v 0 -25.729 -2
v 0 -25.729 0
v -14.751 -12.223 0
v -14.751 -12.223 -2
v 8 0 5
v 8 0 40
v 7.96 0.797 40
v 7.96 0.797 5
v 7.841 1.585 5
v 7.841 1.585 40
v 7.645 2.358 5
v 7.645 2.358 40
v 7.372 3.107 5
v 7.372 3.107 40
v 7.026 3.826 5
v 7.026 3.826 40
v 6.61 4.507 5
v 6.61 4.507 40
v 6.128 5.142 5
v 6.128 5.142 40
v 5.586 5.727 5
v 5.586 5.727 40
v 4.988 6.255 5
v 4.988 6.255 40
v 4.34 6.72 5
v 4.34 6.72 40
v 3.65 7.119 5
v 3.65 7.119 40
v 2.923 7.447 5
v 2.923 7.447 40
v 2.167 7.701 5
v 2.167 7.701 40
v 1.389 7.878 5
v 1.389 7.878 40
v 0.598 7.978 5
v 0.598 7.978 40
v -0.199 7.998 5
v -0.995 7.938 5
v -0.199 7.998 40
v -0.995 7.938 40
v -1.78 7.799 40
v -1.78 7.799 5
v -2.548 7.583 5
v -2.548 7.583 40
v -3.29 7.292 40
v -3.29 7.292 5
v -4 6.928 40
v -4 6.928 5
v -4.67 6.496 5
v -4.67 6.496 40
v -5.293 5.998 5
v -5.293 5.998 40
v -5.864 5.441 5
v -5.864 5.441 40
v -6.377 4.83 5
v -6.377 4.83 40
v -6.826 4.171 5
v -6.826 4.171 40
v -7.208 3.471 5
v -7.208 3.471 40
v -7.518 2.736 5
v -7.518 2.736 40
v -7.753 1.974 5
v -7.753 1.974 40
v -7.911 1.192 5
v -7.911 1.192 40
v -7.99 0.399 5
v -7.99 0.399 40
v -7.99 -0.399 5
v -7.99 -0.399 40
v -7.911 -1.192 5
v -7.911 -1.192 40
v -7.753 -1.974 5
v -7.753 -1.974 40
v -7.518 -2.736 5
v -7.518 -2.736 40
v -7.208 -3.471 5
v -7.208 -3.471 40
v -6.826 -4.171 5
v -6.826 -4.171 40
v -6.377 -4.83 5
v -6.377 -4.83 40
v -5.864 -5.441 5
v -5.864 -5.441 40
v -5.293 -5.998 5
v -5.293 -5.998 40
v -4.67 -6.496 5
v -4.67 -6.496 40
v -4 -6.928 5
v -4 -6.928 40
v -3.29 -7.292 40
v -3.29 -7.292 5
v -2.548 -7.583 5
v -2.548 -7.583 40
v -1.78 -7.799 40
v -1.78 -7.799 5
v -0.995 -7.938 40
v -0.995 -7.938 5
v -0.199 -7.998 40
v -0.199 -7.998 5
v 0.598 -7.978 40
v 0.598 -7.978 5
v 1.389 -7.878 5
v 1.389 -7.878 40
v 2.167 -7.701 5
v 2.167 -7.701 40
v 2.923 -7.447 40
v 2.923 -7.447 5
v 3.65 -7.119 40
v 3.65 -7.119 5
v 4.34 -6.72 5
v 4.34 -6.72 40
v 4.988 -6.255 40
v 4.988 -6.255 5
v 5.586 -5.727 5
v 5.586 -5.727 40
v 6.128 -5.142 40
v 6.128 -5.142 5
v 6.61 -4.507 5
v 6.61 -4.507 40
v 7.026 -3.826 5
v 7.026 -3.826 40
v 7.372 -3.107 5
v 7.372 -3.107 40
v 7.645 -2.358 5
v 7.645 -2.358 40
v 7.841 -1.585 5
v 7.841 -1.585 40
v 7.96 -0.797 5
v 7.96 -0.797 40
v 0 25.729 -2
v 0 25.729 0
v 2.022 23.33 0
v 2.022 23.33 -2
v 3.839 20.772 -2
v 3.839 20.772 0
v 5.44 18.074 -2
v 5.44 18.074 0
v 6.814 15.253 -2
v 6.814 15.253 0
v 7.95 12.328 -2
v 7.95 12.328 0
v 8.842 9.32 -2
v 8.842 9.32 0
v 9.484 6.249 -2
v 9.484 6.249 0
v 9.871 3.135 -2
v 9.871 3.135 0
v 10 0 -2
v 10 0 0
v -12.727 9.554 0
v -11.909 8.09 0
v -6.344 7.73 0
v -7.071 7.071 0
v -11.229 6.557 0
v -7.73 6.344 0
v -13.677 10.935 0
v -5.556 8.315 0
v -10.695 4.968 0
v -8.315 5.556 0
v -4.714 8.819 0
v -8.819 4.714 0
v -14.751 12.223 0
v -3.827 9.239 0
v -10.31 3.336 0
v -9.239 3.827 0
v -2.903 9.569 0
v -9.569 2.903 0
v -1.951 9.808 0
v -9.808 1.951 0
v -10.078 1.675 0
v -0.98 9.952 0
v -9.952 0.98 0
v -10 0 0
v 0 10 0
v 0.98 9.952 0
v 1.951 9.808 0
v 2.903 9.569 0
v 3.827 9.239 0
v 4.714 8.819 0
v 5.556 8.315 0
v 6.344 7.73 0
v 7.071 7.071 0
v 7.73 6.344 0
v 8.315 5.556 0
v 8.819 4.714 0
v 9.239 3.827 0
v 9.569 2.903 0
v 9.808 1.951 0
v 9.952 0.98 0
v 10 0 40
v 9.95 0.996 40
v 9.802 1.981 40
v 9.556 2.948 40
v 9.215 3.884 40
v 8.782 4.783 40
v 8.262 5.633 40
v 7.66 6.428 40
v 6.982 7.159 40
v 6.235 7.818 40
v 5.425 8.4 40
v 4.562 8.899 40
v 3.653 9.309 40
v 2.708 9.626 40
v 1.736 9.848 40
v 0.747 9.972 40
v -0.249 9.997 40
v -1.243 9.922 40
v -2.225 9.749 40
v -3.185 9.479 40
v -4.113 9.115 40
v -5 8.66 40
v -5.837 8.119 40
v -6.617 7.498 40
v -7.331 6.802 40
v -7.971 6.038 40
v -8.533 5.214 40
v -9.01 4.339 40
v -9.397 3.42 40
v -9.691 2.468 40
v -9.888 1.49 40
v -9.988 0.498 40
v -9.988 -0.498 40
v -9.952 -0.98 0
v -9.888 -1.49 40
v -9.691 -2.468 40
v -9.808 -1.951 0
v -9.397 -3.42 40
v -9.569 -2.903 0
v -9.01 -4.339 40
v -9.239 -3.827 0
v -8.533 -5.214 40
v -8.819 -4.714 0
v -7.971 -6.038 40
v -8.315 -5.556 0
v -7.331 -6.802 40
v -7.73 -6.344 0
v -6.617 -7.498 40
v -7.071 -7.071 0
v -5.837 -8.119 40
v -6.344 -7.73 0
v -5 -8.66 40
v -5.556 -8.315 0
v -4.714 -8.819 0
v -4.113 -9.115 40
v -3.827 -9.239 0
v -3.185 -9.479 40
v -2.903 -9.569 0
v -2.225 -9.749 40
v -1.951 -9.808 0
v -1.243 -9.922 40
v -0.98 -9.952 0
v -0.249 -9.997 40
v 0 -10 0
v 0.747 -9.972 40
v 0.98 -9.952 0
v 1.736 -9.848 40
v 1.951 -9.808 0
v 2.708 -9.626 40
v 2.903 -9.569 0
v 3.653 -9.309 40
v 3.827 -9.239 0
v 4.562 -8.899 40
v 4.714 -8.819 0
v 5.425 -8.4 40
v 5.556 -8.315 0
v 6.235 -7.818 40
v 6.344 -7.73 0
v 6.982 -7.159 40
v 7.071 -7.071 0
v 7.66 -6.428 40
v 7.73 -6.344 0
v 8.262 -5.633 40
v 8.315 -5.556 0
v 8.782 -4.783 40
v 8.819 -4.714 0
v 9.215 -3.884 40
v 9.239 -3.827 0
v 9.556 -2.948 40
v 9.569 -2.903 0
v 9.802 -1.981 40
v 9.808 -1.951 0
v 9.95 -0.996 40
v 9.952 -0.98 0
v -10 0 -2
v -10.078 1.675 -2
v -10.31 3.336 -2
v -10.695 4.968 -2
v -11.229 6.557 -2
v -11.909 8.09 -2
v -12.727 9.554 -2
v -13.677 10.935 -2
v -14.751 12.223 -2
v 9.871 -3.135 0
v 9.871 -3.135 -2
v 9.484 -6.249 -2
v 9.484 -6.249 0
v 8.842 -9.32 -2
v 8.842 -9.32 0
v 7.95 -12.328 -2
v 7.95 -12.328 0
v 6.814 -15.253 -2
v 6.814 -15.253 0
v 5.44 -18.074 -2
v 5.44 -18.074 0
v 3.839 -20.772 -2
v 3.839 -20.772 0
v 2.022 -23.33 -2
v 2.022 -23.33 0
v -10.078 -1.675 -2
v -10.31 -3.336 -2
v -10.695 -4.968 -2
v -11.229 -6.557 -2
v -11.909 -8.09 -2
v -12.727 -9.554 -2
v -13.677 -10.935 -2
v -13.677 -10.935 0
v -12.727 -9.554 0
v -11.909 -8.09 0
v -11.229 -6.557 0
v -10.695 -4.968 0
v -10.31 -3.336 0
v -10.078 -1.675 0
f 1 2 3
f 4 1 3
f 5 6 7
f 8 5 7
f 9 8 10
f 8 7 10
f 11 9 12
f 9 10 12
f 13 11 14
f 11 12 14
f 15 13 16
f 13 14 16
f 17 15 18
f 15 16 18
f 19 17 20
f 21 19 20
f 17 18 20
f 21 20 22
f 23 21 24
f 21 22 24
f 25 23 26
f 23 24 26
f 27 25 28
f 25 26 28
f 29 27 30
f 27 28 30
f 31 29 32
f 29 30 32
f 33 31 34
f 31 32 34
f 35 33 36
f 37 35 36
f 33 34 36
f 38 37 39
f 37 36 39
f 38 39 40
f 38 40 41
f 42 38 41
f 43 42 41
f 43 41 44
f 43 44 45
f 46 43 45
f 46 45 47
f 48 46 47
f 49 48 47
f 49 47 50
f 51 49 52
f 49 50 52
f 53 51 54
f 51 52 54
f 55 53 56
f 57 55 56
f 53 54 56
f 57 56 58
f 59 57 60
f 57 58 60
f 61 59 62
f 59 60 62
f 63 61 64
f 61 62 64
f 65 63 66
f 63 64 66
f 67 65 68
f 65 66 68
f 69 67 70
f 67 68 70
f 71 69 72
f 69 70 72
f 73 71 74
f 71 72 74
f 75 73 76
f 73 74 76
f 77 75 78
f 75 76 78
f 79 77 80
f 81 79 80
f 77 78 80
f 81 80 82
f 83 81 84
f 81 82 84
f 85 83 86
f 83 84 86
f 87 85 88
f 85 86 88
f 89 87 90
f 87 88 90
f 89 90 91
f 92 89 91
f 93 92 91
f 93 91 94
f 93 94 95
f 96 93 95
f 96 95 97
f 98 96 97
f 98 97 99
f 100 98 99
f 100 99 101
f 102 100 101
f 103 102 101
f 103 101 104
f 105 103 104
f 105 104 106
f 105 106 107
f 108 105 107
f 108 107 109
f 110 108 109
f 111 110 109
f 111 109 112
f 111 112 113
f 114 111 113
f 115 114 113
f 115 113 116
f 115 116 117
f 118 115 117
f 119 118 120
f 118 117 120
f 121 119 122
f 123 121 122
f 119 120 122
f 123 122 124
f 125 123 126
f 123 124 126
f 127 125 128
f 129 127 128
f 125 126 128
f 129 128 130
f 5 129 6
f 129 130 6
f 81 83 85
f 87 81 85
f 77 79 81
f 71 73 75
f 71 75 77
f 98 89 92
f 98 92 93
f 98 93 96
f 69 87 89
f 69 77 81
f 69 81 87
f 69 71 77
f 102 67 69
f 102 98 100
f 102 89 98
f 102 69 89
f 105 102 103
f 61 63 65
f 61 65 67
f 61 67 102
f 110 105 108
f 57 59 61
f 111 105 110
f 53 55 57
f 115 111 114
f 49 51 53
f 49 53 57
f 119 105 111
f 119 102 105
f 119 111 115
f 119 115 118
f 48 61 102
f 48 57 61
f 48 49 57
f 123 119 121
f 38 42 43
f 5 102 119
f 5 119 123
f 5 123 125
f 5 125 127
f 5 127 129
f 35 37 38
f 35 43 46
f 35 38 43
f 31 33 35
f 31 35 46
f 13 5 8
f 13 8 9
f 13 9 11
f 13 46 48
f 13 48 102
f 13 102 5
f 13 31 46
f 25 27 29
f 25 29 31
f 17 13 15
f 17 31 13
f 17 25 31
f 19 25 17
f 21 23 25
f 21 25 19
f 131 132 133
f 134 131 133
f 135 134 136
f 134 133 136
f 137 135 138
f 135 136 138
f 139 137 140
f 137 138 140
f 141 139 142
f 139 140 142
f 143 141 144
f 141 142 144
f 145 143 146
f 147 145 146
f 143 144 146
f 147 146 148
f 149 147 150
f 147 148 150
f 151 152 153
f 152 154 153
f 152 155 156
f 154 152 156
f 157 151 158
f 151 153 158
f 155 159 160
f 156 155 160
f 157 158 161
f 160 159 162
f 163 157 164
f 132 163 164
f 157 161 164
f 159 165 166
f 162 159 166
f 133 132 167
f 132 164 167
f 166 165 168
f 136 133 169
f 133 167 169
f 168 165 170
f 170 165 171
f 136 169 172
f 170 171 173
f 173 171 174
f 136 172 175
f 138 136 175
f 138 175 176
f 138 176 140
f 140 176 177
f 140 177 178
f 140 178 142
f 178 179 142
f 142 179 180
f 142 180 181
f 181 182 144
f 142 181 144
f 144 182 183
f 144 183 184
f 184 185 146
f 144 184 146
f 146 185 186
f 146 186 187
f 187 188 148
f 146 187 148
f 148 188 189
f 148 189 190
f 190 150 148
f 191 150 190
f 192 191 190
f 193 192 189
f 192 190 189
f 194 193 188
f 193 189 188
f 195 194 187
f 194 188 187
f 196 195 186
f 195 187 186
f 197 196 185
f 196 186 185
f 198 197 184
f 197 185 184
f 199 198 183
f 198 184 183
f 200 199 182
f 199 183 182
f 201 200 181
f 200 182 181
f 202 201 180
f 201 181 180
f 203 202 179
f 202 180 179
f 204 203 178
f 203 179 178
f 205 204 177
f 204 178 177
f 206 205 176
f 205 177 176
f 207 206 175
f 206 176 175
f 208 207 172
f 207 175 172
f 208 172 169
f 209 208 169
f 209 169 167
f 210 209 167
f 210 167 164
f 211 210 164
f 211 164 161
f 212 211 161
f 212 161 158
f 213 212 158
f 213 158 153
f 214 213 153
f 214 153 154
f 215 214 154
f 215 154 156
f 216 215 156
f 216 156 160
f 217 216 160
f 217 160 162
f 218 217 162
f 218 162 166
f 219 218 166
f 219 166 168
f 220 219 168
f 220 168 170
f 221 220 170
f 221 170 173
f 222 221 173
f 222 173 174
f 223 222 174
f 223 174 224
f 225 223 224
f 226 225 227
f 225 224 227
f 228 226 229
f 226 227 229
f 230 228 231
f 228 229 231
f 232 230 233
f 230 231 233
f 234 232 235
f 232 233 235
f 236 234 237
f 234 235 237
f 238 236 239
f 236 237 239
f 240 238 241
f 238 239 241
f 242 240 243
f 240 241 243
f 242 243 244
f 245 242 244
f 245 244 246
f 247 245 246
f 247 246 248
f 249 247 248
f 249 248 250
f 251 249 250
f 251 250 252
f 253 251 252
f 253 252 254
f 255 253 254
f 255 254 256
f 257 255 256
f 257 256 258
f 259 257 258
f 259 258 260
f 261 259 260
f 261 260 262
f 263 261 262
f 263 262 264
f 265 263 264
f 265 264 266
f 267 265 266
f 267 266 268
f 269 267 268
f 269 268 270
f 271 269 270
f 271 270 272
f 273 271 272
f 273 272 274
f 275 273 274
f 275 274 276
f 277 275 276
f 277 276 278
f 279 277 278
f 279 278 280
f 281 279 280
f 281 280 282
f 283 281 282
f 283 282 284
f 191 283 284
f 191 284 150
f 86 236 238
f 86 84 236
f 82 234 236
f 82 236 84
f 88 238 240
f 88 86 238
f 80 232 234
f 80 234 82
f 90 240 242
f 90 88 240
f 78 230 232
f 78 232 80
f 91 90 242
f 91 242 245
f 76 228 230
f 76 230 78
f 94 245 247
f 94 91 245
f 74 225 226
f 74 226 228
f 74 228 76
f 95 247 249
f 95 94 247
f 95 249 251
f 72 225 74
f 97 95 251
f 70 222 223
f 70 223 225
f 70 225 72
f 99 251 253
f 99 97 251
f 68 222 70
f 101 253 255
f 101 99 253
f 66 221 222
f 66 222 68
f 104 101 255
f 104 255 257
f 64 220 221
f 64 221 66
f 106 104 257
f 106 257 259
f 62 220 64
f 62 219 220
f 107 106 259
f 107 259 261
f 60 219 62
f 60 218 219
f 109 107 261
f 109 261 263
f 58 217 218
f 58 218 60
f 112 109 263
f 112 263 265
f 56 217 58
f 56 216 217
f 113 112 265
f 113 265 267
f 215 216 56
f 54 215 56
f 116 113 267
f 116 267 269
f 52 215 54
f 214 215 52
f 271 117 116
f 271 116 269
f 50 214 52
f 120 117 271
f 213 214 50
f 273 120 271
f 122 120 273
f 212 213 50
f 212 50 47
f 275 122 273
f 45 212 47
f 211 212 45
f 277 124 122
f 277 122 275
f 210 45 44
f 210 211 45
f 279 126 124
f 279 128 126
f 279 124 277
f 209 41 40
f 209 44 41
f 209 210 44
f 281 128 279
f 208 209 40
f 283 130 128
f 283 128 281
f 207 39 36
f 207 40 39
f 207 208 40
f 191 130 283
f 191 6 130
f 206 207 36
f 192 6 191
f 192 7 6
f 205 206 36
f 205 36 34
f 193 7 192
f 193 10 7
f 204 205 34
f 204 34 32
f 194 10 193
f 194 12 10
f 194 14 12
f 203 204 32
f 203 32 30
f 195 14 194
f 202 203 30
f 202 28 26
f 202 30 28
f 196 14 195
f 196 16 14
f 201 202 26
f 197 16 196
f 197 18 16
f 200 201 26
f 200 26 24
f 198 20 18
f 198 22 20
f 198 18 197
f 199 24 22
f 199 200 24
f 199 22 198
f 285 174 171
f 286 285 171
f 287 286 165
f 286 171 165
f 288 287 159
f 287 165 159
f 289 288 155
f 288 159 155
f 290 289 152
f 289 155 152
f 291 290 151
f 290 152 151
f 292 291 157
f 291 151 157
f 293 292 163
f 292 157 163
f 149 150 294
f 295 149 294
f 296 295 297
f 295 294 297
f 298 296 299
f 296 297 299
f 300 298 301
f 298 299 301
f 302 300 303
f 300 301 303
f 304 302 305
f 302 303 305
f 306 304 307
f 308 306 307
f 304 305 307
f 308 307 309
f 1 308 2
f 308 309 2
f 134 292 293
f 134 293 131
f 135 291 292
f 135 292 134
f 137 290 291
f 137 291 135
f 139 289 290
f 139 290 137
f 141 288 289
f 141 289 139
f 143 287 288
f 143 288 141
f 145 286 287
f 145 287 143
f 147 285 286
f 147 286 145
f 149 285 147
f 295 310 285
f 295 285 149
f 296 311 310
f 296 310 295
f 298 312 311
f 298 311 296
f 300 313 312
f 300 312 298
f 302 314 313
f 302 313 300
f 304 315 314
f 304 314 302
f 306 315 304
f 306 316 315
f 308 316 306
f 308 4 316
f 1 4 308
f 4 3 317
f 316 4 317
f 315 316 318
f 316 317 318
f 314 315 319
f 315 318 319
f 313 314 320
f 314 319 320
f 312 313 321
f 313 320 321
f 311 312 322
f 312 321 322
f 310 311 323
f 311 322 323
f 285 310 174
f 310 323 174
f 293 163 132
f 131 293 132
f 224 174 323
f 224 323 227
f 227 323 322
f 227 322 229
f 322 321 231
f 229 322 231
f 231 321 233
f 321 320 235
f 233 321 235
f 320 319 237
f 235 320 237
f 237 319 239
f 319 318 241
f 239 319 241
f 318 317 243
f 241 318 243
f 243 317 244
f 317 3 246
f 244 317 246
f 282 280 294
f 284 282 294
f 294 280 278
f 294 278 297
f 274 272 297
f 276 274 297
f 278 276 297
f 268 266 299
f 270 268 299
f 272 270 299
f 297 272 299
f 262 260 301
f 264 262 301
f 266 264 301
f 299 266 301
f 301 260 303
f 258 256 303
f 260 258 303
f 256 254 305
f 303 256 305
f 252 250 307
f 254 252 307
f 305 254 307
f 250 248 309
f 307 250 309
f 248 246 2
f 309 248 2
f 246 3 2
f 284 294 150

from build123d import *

# Parameters (mm, degrees)
F0_R     = 10
F1_DEPTH = 40
F2_R     = 8
F3_DEPTH = 35
F5_DEPTH = 2


with BuildPart() as f1:
    # F0 (on Top) → F1 (new body)
    with BuildSketch(Plane.XY):
        Circle(F0_R)
    extrude(amount=F1_DEPTH)

    # F2 (on face) → F3 (cut)
    with BuildSketch(Plane.XY.offset(40)):
        Circle(F2_R)
    extrude(amount=-F3_DEPTH, mode=Mode.SUBTRACT)

    # F4 (on face) → F5 (join)
    with BuildSketch(Plane(origin=(0, 0, 0), x_dir=(1, 0, 0), z_dir=(0, 0, -1))):
        with BuildLine():
            Line((-10, 0), (0, 0))
            Line((0, 0), (10, 0))
            ThreePointArc((10, 0), (0, 10), (-10, 0))
        make_face()
        with BuildLine():
            Line((10, 0), (0, 0))
            Line((0, 0), (-10, 0))
            ThreePointArc((-10, 0), (0, -10), (10, 0))
        make_face()
        with BuildLine():
            ThreePointArc((-10, 0), (0, 10), (10, 0))
            ThreePointArc((10, 0), (7.4121106103, 13.8021737418), (0, 25.7293606605))
            Line((0, 25.7293606605), (-14.750656168, 12.223134592))
            ThreePointArc((-14.750656168, 12.223134592), (-11.2294172691, 6.5569381818), (-10, 0))
        make_face()
        with BuildLine():
            ThreePointArc((0, -25.7293606605), (7.4121106103, -13.8021737418), (10, 0))
            ThreePointArc((10, 0), (0, -10), (-10, 0))
            ThreePointArc((-10, 0), (-11.2294172691, -6.5569381818), (-14.750656168, -12.223134592))
            Line((-14.750656168, -12.223134592), (0, -25.7293606605))
        make_face()
    extrude(amount=F5_DEPTH)


solid = f1.part
